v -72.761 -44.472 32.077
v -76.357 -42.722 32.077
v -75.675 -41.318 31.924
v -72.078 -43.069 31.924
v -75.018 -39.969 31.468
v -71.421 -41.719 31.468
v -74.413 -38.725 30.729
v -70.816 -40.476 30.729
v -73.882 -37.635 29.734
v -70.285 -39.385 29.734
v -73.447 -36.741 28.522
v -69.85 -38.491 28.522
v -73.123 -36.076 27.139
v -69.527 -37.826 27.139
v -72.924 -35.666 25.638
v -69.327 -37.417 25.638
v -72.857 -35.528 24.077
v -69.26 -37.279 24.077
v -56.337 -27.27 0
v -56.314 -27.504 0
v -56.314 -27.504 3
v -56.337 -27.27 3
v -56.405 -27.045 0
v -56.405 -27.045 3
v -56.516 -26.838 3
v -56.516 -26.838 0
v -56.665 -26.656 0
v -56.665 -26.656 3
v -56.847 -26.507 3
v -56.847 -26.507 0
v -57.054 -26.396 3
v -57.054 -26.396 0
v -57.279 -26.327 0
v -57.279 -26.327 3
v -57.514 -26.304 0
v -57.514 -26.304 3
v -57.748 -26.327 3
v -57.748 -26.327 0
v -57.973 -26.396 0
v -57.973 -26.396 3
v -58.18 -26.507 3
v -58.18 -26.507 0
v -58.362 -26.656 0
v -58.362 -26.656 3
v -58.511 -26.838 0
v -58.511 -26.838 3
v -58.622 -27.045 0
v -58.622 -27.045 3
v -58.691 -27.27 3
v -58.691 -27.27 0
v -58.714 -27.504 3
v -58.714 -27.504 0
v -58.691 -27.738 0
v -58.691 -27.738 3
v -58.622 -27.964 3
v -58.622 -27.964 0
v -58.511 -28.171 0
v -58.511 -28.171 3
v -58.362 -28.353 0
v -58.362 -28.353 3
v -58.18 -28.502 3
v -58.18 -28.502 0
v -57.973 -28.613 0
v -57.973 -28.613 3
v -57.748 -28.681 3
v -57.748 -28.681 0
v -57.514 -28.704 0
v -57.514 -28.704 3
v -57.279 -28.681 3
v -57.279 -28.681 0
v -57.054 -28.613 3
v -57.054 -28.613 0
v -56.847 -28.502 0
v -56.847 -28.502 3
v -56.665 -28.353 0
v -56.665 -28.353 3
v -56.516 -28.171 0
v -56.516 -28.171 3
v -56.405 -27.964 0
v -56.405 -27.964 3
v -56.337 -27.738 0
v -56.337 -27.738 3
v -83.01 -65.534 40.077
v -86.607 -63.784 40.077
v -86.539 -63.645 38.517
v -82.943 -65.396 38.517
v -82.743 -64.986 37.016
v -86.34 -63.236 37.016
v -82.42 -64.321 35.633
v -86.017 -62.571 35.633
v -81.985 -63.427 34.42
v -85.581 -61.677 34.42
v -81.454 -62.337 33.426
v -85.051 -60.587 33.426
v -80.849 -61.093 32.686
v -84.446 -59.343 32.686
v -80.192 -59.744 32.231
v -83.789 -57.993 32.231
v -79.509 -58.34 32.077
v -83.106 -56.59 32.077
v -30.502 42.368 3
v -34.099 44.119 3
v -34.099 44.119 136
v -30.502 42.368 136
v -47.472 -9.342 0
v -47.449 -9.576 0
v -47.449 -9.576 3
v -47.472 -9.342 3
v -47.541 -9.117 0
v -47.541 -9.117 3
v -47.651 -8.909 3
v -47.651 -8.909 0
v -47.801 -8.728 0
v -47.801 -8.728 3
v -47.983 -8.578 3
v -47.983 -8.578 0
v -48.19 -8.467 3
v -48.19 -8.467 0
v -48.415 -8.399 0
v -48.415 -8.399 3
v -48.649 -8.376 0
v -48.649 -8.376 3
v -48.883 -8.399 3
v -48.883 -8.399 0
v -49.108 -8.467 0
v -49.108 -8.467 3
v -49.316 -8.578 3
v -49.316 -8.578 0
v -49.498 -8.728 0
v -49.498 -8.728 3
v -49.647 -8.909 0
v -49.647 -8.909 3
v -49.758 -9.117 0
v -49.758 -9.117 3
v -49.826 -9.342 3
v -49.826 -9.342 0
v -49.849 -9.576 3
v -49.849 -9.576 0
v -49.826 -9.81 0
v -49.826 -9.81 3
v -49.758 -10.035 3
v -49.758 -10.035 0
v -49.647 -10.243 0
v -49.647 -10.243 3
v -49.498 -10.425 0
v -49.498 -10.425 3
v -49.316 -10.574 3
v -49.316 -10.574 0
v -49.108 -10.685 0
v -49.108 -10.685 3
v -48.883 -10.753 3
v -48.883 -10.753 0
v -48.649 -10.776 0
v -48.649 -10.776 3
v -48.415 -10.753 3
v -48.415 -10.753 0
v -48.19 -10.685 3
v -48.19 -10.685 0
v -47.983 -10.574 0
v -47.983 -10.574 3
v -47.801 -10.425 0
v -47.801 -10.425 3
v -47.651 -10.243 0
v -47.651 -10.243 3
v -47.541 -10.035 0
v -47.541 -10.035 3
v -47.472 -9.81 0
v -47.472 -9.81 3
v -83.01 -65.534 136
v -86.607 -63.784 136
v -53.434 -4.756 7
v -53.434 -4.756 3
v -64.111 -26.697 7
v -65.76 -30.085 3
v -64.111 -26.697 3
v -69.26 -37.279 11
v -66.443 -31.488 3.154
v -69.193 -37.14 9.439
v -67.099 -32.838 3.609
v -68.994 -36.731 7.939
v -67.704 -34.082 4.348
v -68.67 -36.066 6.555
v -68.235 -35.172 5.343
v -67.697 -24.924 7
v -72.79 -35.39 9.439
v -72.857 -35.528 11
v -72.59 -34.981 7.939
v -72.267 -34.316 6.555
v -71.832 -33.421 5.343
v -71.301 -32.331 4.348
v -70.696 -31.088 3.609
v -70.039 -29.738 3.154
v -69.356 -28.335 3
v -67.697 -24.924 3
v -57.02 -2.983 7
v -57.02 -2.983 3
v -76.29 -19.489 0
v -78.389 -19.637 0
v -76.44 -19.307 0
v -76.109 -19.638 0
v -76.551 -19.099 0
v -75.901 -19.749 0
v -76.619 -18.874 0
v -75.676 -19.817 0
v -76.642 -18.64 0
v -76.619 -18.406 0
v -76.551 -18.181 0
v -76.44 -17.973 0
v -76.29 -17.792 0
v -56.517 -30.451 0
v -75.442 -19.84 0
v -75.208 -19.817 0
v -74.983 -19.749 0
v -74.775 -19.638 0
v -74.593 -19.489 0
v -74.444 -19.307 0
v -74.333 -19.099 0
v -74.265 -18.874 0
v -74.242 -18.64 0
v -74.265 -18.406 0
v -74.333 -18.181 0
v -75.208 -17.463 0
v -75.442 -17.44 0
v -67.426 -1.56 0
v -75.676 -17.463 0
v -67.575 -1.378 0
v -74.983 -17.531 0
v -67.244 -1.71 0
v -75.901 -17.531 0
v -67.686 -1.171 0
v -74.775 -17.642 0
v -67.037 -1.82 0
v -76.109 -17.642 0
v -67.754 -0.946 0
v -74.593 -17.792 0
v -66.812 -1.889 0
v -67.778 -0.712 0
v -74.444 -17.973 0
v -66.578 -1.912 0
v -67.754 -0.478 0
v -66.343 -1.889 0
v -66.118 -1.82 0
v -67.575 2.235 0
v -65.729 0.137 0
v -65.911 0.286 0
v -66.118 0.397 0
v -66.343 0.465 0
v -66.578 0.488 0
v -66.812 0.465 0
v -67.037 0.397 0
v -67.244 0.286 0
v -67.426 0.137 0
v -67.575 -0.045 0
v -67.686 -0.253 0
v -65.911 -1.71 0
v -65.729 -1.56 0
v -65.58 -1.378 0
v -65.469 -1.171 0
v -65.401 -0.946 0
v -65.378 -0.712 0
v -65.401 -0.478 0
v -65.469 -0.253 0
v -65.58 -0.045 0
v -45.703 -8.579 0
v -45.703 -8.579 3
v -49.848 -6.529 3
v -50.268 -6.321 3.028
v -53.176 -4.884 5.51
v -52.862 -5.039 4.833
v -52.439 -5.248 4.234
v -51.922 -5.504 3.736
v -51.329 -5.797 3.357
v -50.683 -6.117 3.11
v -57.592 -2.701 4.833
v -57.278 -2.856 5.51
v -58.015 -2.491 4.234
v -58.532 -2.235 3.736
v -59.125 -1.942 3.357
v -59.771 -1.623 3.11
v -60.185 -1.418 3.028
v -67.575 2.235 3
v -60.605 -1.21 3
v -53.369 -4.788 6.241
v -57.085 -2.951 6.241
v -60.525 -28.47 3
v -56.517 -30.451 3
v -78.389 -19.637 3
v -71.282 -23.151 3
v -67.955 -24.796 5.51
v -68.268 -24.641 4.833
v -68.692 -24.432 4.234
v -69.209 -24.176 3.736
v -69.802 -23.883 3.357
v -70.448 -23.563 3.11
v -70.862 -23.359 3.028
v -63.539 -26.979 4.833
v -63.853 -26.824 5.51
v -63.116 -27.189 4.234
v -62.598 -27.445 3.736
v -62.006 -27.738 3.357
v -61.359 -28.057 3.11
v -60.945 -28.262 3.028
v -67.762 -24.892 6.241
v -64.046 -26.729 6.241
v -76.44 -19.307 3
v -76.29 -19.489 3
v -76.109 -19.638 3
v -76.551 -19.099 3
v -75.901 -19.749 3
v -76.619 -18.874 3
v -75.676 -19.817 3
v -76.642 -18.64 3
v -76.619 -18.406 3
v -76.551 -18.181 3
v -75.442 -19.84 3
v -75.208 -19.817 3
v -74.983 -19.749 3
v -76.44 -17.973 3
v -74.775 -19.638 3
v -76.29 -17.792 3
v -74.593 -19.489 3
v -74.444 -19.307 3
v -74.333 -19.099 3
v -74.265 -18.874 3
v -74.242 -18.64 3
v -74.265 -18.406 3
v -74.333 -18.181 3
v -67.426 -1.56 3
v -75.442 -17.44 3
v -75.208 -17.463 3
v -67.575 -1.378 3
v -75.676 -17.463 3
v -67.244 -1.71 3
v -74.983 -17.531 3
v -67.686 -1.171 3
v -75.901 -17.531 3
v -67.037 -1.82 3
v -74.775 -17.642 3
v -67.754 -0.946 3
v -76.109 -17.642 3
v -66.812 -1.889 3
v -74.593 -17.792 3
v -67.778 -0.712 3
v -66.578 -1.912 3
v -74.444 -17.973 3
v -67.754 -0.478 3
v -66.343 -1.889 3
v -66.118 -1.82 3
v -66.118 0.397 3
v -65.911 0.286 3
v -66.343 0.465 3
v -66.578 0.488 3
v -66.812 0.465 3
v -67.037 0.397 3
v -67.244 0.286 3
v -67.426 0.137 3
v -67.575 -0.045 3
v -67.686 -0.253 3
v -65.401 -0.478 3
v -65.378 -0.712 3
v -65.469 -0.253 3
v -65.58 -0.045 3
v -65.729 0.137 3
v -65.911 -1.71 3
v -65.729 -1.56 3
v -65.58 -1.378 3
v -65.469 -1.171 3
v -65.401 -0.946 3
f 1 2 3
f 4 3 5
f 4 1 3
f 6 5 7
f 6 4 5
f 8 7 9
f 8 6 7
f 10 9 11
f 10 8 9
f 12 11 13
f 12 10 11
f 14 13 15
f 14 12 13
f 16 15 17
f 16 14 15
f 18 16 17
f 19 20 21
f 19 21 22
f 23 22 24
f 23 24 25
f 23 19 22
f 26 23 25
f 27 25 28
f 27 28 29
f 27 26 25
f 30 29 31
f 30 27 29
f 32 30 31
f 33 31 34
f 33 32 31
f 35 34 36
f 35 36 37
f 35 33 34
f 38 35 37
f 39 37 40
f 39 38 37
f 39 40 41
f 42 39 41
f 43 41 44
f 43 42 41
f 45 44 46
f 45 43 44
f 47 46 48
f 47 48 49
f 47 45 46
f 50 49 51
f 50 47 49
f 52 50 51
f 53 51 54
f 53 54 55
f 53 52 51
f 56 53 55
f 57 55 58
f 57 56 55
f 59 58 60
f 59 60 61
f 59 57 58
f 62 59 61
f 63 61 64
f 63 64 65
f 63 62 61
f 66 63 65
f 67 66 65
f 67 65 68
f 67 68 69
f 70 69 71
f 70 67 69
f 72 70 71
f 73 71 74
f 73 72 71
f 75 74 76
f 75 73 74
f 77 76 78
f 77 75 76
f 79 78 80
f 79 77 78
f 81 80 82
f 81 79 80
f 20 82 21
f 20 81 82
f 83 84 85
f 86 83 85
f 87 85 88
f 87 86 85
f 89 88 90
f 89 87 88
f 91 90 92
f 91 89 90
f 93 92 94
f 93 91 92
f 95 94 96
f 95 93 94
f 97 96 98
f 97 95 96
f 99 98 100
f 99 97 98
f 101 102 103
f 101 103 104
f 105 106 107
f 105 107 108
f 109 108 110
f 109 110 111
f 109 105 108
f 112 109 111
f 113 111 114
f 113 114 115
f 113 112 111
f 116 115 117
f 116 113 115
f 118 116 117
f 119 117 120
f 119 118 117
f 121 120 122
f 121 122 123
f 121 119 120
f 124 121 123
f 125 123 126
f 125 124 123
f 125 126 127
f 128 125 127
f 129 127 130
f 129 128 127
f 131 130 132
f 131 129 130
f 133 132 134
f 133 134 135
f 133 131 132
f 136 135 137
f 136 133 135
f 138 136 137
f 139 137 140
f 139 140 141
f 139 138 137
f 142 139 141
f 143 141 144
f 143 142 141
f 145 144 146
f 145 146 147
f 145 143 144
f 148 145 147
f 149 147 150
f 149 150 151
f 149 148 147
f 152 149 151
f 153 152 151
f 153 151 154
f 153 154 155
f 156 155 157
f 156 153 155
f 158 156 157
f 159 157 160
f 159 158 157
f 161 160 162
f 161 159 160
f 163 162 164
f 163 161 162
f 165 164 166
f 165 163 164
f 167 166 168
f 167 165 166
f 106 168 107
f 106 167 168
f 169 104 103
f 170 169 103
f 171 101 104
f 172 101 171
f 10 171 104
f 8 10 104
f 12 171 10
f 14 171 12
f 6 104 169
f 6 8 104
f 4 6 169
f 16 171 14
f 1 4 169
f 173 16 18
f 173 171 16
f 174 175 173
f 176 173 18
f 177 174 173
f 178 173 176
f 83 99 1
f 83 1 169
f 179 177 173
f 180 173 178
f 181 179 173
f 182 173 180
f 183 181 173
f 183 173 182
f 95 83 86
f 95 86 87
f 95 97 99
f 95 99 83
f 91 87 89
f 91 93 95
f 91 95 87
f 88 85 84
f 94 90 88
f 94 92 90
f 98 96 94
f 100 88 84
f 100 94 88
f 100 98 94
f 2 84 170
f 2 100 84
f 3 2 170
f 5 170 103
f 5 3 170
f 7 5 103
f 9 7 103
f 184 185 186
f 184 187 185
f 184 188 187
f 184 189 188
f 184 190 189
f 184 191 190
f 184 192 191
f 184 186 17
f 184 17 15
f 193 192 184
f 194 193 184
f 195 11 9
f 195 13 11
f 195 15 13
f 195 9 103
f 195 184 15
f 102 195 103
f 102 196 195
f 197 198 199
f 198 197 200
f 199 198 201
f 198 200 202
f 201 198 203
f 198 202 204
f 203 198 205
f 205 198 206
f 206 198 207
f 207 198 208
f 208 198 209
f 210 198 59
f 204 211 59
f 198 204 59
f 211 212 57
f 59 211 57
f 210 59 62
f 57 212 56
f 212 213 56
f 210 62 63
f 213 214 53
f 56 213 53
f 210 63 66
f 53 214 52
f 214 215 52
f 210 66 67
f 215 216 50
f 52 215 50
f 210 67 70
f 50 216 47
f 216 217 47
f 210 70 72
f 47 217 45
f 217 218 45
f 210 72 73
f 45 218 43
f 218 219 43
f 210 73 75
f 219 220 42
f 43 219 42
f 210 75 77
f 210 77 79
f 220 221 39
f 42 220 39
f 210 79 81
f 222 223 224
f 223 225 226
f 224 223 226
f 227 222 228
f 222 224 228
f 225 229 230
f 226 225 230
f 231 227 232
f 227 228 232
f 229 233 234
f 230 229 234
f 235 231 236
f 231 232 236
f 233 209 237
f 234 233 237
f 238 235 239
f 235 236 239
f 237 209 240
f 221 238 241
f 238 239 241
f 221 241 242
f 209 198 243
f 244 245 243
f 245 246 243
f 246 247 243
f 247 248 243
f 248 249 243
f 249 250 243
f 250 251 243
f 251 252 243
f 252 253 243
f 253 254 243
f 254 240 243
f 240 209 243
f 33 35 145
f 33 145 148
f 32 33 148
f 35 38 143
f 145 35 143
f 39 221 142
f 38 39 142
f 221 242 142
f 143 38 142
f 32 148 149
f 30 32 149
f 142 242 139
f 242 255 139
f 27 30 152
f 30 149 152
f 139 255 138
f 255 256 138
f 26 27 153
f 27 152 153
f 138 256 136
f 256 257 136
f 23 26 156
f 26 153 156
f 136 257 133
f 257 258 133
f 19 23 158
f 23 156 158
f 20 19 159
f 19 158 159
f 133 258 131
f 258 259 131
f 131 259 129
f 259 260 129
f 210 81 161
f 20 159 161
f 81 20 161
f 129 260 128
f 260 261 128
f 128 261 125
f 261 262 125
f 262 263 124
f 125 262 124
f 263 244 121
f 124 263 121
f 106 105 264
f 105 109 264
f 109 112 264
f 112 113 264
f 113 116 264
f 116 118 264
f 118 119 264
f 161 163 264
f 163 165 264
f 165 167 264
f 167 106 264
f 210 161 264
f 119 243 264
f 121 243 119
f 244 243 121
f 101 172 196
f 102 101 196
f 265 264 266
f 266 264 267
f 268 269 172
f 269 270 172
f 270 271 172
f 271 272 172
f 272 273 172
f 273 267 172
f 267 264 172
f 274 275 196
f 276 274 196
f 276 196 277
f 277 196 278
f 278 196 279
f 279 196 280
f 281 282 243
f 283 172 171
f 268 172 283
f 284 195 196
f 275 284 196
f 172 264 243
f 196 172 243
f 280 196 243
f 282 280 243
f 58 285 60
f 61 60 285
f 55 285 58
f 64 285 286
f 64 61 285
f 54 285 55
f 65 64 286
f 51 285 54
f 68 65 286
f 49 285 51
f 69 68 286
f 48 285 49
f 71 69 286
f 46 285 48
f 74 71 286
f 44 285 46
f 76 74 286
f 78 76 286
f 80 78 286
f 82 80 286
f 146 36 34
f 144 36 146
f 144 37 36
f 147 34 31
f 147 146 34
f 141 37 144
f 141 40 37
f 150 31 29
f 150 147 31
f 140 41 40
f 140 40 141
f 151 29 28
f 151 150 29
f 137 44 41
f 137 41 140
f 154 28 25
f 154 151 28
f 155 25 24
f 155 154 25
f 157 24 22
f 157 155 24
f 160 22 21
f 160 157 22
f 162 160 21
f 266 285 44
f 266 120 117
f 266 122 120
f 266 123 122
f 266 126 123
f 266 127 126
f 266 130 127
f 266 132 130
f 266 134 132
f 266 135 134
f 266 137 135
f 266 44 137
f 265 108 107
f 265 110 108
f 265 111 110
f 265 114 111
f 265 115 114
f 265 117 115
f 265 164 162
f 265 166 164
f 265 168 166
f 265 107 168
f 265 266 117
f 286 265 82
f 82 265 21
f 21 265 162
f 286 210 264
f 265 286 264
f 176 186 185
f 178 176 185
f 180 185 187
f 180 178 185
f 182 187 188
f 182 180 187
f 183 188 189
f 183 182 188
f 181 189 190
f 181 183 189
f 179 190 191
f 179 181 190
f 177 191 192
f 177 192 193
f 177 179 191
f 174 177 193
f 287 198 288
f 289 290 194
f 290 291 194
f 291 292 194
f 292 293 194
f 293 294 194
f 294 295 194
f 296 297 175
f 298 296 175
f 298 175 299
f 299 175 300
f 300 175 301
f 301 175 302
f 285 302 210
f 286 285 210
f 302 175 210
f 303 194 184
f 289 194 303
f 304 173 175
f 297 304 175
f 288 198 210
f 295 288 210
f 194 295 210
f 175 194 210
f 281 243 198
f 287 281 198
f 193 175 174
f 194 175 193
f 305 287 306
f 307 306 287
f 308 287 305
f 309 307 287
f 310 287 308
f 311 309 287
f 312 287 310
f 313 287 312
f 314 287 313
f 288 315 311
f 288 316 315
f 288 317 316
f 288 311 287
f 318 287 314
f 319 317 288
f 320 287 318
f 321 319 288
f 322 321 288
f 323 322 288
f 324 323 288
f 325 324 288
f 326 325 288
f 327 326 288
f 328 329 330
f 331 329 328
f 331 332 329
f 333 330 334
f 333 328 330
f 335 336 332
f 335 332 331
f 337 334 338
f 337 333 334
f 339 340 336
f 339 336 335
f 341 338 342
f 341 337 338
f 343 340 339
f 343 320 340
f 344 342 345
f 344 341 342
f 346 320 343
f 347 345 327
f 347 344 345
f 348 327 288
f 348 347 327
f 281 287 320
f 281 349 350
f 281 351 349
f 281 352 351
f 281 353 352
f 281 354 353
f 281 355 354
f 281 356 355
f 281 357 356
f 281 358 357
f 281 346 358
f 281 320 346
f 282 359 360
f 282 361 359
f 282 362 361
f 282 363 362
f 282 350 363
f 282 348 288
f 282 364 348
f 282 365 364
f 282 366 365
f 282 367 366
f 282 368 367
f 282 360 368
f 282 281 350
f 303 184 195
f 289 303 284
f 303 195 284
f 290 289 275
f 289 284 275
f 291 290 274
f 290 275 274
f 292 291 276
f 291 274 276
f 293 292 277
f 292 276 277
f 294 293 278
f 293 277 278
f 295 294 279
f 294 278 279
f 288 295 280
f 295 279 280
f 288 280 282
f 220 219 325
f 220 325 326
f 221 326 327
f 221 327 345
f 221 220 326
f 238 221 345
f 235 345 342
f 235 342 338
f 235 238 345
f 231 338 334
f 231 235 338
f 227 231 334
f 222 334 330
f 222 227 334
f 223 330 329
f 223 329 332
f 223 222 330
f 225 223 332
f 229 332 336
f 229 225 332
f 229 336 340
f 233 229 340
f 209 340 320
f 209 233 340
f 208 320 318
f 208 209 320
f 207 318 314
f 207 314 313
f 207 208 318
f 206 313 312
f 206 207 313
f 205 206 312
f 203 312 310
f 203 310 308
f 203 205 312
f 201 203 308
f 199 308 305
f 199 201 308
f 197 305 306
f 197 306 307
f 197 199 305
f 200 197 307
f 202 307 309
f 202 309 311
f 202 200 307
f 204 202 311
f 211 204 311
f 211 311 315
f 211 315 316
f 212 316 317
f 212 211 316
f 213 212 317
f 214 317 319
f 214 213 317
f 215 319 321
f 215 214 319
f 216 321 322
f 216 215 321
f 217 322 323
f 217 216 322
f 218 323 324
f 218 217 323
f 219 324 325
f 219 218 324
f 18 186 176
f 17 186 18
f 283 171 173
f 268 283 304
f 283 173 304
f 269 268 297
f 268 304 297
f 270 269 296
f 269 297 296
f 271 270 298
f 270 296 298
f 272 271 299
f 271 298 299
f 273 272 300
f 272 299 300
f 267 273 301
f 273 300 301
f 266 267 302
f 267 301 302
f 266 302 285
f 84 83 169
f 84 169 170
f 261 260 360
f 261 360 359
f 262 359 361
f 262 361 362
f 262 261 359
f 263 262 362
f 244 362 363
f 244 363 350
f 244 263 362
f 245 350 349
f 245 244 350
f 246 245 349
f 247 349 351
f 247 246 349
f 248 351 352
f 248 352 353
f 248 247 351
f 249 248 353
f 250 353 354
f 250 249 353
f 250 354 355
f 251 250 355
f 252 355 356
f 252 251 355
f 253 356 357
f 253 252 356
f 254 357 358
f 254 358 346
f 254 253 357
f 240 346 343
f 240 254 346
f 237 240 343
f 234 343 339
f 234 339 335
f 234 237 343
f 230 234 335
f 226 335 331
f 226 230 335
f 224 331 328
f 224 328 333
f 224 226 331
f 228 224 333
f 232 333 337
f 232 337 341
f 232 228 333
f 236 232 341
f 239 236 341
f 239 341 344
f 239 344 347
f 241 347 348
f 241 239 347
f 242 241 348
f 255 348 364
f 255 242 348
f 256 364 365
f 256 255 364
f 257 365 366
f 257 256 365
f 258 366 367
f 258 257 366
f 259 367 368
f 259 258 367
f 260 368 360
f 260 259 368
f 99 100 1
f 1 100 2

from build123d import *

# Parameters (mm, degrees)
SKETCH_1_R          = 1.2
EXTRUDE_1_DEPTH     = 3
EXTRUDE_2_DEPTH     = 133
FILLET_1_R          = 4
SKETCH_4_W          = 29.077288304
SKETCH_4_H          = 31.423180799
CUT_EXTRUDE_1_DEPTH = 4
FILLET_3_R          = 8


with BuildPart() as part:
    # 草图1 → 凸台-拉伸1 (new body)
    with BuildSketch(Plane.XY):
        Polygon((-67.574588252, 2.235418745), (-78.389048292, -19.637108636), (-56.517207821, -30.451229046), (-45.702747781, -8.578701665), align=None)
        with Locations((-66.577549394, -0.711768645)):
            Circle(SKETCH_1_R, mode=Mode.SUBTRACT)
        with Locations((-75.441860902, -18.640069777)):
            Circle(SKETCH_1_R, mode=Mode.SUBTRACT)
        with Locations((-57.51355977, -27.504381286)):
            Circle(SKETCH_1_R, mode=Mode.SUBTRACT)
        with Locations((-48.649248262, -9.576080153)):
            Circle(SKETCH_1_R, mode=Mode.SUBTRACT)
    extrude(amount=EXTRUDE_1_DEPTH)

    # 草图2 → 凸台-拉伸2 (add)
    with BuildSketch(Plane.XY.offset(3)):
        Polygon((-86.606649797, -63.783530386), (-34.098567754, 44.118746329), (-30.501825197, 42.368476928), (-83.00990724, -65.533799787), align=None)
    extrude(amount=EXTRUDE_2_DEPTH)

    # 圆角1
    fillet_1_edges = [part.edges().sort_by_distance(p)[0] for p in [
        (-58.772343801, -15.726452512, 3),
        (-62.358074987, -13.953555126, 3),
    ]]
    fillet(fillet_1_edges, radius=FILLET_1_R)

    # 草图4 → 切除-拉伸1 (cut)
    with BuildSketch(Plane(origin=(-44.928588602, 21.863431321, 0), x_dir=(0, 0, 1), z_dir=(-0.8991856392880848, 0.43756735035658034, 0))):
        with Locations((17.538644152, -79.537886422)):
            Rectangle(SKETCH_4_W, SKETCH_4_H)
    extrude(amount=-CUT_EXTRUDE_1_DEPTH, mode=Mode.SUBTRACT)

    # 圆角3
    fillet_3_edges = [part.edges().sort_by_distance(p)[0] for p in [
        (-71.058520557, -36.403392171, 3),
        (-71.058520557, -36.403392171, 32.077288304),
        (-84.808278518, -64.658665086, 32.077288304),
    ]]
    fillet(fillet_3_edges, radius=FILLET_3_R)


solid = part.part
